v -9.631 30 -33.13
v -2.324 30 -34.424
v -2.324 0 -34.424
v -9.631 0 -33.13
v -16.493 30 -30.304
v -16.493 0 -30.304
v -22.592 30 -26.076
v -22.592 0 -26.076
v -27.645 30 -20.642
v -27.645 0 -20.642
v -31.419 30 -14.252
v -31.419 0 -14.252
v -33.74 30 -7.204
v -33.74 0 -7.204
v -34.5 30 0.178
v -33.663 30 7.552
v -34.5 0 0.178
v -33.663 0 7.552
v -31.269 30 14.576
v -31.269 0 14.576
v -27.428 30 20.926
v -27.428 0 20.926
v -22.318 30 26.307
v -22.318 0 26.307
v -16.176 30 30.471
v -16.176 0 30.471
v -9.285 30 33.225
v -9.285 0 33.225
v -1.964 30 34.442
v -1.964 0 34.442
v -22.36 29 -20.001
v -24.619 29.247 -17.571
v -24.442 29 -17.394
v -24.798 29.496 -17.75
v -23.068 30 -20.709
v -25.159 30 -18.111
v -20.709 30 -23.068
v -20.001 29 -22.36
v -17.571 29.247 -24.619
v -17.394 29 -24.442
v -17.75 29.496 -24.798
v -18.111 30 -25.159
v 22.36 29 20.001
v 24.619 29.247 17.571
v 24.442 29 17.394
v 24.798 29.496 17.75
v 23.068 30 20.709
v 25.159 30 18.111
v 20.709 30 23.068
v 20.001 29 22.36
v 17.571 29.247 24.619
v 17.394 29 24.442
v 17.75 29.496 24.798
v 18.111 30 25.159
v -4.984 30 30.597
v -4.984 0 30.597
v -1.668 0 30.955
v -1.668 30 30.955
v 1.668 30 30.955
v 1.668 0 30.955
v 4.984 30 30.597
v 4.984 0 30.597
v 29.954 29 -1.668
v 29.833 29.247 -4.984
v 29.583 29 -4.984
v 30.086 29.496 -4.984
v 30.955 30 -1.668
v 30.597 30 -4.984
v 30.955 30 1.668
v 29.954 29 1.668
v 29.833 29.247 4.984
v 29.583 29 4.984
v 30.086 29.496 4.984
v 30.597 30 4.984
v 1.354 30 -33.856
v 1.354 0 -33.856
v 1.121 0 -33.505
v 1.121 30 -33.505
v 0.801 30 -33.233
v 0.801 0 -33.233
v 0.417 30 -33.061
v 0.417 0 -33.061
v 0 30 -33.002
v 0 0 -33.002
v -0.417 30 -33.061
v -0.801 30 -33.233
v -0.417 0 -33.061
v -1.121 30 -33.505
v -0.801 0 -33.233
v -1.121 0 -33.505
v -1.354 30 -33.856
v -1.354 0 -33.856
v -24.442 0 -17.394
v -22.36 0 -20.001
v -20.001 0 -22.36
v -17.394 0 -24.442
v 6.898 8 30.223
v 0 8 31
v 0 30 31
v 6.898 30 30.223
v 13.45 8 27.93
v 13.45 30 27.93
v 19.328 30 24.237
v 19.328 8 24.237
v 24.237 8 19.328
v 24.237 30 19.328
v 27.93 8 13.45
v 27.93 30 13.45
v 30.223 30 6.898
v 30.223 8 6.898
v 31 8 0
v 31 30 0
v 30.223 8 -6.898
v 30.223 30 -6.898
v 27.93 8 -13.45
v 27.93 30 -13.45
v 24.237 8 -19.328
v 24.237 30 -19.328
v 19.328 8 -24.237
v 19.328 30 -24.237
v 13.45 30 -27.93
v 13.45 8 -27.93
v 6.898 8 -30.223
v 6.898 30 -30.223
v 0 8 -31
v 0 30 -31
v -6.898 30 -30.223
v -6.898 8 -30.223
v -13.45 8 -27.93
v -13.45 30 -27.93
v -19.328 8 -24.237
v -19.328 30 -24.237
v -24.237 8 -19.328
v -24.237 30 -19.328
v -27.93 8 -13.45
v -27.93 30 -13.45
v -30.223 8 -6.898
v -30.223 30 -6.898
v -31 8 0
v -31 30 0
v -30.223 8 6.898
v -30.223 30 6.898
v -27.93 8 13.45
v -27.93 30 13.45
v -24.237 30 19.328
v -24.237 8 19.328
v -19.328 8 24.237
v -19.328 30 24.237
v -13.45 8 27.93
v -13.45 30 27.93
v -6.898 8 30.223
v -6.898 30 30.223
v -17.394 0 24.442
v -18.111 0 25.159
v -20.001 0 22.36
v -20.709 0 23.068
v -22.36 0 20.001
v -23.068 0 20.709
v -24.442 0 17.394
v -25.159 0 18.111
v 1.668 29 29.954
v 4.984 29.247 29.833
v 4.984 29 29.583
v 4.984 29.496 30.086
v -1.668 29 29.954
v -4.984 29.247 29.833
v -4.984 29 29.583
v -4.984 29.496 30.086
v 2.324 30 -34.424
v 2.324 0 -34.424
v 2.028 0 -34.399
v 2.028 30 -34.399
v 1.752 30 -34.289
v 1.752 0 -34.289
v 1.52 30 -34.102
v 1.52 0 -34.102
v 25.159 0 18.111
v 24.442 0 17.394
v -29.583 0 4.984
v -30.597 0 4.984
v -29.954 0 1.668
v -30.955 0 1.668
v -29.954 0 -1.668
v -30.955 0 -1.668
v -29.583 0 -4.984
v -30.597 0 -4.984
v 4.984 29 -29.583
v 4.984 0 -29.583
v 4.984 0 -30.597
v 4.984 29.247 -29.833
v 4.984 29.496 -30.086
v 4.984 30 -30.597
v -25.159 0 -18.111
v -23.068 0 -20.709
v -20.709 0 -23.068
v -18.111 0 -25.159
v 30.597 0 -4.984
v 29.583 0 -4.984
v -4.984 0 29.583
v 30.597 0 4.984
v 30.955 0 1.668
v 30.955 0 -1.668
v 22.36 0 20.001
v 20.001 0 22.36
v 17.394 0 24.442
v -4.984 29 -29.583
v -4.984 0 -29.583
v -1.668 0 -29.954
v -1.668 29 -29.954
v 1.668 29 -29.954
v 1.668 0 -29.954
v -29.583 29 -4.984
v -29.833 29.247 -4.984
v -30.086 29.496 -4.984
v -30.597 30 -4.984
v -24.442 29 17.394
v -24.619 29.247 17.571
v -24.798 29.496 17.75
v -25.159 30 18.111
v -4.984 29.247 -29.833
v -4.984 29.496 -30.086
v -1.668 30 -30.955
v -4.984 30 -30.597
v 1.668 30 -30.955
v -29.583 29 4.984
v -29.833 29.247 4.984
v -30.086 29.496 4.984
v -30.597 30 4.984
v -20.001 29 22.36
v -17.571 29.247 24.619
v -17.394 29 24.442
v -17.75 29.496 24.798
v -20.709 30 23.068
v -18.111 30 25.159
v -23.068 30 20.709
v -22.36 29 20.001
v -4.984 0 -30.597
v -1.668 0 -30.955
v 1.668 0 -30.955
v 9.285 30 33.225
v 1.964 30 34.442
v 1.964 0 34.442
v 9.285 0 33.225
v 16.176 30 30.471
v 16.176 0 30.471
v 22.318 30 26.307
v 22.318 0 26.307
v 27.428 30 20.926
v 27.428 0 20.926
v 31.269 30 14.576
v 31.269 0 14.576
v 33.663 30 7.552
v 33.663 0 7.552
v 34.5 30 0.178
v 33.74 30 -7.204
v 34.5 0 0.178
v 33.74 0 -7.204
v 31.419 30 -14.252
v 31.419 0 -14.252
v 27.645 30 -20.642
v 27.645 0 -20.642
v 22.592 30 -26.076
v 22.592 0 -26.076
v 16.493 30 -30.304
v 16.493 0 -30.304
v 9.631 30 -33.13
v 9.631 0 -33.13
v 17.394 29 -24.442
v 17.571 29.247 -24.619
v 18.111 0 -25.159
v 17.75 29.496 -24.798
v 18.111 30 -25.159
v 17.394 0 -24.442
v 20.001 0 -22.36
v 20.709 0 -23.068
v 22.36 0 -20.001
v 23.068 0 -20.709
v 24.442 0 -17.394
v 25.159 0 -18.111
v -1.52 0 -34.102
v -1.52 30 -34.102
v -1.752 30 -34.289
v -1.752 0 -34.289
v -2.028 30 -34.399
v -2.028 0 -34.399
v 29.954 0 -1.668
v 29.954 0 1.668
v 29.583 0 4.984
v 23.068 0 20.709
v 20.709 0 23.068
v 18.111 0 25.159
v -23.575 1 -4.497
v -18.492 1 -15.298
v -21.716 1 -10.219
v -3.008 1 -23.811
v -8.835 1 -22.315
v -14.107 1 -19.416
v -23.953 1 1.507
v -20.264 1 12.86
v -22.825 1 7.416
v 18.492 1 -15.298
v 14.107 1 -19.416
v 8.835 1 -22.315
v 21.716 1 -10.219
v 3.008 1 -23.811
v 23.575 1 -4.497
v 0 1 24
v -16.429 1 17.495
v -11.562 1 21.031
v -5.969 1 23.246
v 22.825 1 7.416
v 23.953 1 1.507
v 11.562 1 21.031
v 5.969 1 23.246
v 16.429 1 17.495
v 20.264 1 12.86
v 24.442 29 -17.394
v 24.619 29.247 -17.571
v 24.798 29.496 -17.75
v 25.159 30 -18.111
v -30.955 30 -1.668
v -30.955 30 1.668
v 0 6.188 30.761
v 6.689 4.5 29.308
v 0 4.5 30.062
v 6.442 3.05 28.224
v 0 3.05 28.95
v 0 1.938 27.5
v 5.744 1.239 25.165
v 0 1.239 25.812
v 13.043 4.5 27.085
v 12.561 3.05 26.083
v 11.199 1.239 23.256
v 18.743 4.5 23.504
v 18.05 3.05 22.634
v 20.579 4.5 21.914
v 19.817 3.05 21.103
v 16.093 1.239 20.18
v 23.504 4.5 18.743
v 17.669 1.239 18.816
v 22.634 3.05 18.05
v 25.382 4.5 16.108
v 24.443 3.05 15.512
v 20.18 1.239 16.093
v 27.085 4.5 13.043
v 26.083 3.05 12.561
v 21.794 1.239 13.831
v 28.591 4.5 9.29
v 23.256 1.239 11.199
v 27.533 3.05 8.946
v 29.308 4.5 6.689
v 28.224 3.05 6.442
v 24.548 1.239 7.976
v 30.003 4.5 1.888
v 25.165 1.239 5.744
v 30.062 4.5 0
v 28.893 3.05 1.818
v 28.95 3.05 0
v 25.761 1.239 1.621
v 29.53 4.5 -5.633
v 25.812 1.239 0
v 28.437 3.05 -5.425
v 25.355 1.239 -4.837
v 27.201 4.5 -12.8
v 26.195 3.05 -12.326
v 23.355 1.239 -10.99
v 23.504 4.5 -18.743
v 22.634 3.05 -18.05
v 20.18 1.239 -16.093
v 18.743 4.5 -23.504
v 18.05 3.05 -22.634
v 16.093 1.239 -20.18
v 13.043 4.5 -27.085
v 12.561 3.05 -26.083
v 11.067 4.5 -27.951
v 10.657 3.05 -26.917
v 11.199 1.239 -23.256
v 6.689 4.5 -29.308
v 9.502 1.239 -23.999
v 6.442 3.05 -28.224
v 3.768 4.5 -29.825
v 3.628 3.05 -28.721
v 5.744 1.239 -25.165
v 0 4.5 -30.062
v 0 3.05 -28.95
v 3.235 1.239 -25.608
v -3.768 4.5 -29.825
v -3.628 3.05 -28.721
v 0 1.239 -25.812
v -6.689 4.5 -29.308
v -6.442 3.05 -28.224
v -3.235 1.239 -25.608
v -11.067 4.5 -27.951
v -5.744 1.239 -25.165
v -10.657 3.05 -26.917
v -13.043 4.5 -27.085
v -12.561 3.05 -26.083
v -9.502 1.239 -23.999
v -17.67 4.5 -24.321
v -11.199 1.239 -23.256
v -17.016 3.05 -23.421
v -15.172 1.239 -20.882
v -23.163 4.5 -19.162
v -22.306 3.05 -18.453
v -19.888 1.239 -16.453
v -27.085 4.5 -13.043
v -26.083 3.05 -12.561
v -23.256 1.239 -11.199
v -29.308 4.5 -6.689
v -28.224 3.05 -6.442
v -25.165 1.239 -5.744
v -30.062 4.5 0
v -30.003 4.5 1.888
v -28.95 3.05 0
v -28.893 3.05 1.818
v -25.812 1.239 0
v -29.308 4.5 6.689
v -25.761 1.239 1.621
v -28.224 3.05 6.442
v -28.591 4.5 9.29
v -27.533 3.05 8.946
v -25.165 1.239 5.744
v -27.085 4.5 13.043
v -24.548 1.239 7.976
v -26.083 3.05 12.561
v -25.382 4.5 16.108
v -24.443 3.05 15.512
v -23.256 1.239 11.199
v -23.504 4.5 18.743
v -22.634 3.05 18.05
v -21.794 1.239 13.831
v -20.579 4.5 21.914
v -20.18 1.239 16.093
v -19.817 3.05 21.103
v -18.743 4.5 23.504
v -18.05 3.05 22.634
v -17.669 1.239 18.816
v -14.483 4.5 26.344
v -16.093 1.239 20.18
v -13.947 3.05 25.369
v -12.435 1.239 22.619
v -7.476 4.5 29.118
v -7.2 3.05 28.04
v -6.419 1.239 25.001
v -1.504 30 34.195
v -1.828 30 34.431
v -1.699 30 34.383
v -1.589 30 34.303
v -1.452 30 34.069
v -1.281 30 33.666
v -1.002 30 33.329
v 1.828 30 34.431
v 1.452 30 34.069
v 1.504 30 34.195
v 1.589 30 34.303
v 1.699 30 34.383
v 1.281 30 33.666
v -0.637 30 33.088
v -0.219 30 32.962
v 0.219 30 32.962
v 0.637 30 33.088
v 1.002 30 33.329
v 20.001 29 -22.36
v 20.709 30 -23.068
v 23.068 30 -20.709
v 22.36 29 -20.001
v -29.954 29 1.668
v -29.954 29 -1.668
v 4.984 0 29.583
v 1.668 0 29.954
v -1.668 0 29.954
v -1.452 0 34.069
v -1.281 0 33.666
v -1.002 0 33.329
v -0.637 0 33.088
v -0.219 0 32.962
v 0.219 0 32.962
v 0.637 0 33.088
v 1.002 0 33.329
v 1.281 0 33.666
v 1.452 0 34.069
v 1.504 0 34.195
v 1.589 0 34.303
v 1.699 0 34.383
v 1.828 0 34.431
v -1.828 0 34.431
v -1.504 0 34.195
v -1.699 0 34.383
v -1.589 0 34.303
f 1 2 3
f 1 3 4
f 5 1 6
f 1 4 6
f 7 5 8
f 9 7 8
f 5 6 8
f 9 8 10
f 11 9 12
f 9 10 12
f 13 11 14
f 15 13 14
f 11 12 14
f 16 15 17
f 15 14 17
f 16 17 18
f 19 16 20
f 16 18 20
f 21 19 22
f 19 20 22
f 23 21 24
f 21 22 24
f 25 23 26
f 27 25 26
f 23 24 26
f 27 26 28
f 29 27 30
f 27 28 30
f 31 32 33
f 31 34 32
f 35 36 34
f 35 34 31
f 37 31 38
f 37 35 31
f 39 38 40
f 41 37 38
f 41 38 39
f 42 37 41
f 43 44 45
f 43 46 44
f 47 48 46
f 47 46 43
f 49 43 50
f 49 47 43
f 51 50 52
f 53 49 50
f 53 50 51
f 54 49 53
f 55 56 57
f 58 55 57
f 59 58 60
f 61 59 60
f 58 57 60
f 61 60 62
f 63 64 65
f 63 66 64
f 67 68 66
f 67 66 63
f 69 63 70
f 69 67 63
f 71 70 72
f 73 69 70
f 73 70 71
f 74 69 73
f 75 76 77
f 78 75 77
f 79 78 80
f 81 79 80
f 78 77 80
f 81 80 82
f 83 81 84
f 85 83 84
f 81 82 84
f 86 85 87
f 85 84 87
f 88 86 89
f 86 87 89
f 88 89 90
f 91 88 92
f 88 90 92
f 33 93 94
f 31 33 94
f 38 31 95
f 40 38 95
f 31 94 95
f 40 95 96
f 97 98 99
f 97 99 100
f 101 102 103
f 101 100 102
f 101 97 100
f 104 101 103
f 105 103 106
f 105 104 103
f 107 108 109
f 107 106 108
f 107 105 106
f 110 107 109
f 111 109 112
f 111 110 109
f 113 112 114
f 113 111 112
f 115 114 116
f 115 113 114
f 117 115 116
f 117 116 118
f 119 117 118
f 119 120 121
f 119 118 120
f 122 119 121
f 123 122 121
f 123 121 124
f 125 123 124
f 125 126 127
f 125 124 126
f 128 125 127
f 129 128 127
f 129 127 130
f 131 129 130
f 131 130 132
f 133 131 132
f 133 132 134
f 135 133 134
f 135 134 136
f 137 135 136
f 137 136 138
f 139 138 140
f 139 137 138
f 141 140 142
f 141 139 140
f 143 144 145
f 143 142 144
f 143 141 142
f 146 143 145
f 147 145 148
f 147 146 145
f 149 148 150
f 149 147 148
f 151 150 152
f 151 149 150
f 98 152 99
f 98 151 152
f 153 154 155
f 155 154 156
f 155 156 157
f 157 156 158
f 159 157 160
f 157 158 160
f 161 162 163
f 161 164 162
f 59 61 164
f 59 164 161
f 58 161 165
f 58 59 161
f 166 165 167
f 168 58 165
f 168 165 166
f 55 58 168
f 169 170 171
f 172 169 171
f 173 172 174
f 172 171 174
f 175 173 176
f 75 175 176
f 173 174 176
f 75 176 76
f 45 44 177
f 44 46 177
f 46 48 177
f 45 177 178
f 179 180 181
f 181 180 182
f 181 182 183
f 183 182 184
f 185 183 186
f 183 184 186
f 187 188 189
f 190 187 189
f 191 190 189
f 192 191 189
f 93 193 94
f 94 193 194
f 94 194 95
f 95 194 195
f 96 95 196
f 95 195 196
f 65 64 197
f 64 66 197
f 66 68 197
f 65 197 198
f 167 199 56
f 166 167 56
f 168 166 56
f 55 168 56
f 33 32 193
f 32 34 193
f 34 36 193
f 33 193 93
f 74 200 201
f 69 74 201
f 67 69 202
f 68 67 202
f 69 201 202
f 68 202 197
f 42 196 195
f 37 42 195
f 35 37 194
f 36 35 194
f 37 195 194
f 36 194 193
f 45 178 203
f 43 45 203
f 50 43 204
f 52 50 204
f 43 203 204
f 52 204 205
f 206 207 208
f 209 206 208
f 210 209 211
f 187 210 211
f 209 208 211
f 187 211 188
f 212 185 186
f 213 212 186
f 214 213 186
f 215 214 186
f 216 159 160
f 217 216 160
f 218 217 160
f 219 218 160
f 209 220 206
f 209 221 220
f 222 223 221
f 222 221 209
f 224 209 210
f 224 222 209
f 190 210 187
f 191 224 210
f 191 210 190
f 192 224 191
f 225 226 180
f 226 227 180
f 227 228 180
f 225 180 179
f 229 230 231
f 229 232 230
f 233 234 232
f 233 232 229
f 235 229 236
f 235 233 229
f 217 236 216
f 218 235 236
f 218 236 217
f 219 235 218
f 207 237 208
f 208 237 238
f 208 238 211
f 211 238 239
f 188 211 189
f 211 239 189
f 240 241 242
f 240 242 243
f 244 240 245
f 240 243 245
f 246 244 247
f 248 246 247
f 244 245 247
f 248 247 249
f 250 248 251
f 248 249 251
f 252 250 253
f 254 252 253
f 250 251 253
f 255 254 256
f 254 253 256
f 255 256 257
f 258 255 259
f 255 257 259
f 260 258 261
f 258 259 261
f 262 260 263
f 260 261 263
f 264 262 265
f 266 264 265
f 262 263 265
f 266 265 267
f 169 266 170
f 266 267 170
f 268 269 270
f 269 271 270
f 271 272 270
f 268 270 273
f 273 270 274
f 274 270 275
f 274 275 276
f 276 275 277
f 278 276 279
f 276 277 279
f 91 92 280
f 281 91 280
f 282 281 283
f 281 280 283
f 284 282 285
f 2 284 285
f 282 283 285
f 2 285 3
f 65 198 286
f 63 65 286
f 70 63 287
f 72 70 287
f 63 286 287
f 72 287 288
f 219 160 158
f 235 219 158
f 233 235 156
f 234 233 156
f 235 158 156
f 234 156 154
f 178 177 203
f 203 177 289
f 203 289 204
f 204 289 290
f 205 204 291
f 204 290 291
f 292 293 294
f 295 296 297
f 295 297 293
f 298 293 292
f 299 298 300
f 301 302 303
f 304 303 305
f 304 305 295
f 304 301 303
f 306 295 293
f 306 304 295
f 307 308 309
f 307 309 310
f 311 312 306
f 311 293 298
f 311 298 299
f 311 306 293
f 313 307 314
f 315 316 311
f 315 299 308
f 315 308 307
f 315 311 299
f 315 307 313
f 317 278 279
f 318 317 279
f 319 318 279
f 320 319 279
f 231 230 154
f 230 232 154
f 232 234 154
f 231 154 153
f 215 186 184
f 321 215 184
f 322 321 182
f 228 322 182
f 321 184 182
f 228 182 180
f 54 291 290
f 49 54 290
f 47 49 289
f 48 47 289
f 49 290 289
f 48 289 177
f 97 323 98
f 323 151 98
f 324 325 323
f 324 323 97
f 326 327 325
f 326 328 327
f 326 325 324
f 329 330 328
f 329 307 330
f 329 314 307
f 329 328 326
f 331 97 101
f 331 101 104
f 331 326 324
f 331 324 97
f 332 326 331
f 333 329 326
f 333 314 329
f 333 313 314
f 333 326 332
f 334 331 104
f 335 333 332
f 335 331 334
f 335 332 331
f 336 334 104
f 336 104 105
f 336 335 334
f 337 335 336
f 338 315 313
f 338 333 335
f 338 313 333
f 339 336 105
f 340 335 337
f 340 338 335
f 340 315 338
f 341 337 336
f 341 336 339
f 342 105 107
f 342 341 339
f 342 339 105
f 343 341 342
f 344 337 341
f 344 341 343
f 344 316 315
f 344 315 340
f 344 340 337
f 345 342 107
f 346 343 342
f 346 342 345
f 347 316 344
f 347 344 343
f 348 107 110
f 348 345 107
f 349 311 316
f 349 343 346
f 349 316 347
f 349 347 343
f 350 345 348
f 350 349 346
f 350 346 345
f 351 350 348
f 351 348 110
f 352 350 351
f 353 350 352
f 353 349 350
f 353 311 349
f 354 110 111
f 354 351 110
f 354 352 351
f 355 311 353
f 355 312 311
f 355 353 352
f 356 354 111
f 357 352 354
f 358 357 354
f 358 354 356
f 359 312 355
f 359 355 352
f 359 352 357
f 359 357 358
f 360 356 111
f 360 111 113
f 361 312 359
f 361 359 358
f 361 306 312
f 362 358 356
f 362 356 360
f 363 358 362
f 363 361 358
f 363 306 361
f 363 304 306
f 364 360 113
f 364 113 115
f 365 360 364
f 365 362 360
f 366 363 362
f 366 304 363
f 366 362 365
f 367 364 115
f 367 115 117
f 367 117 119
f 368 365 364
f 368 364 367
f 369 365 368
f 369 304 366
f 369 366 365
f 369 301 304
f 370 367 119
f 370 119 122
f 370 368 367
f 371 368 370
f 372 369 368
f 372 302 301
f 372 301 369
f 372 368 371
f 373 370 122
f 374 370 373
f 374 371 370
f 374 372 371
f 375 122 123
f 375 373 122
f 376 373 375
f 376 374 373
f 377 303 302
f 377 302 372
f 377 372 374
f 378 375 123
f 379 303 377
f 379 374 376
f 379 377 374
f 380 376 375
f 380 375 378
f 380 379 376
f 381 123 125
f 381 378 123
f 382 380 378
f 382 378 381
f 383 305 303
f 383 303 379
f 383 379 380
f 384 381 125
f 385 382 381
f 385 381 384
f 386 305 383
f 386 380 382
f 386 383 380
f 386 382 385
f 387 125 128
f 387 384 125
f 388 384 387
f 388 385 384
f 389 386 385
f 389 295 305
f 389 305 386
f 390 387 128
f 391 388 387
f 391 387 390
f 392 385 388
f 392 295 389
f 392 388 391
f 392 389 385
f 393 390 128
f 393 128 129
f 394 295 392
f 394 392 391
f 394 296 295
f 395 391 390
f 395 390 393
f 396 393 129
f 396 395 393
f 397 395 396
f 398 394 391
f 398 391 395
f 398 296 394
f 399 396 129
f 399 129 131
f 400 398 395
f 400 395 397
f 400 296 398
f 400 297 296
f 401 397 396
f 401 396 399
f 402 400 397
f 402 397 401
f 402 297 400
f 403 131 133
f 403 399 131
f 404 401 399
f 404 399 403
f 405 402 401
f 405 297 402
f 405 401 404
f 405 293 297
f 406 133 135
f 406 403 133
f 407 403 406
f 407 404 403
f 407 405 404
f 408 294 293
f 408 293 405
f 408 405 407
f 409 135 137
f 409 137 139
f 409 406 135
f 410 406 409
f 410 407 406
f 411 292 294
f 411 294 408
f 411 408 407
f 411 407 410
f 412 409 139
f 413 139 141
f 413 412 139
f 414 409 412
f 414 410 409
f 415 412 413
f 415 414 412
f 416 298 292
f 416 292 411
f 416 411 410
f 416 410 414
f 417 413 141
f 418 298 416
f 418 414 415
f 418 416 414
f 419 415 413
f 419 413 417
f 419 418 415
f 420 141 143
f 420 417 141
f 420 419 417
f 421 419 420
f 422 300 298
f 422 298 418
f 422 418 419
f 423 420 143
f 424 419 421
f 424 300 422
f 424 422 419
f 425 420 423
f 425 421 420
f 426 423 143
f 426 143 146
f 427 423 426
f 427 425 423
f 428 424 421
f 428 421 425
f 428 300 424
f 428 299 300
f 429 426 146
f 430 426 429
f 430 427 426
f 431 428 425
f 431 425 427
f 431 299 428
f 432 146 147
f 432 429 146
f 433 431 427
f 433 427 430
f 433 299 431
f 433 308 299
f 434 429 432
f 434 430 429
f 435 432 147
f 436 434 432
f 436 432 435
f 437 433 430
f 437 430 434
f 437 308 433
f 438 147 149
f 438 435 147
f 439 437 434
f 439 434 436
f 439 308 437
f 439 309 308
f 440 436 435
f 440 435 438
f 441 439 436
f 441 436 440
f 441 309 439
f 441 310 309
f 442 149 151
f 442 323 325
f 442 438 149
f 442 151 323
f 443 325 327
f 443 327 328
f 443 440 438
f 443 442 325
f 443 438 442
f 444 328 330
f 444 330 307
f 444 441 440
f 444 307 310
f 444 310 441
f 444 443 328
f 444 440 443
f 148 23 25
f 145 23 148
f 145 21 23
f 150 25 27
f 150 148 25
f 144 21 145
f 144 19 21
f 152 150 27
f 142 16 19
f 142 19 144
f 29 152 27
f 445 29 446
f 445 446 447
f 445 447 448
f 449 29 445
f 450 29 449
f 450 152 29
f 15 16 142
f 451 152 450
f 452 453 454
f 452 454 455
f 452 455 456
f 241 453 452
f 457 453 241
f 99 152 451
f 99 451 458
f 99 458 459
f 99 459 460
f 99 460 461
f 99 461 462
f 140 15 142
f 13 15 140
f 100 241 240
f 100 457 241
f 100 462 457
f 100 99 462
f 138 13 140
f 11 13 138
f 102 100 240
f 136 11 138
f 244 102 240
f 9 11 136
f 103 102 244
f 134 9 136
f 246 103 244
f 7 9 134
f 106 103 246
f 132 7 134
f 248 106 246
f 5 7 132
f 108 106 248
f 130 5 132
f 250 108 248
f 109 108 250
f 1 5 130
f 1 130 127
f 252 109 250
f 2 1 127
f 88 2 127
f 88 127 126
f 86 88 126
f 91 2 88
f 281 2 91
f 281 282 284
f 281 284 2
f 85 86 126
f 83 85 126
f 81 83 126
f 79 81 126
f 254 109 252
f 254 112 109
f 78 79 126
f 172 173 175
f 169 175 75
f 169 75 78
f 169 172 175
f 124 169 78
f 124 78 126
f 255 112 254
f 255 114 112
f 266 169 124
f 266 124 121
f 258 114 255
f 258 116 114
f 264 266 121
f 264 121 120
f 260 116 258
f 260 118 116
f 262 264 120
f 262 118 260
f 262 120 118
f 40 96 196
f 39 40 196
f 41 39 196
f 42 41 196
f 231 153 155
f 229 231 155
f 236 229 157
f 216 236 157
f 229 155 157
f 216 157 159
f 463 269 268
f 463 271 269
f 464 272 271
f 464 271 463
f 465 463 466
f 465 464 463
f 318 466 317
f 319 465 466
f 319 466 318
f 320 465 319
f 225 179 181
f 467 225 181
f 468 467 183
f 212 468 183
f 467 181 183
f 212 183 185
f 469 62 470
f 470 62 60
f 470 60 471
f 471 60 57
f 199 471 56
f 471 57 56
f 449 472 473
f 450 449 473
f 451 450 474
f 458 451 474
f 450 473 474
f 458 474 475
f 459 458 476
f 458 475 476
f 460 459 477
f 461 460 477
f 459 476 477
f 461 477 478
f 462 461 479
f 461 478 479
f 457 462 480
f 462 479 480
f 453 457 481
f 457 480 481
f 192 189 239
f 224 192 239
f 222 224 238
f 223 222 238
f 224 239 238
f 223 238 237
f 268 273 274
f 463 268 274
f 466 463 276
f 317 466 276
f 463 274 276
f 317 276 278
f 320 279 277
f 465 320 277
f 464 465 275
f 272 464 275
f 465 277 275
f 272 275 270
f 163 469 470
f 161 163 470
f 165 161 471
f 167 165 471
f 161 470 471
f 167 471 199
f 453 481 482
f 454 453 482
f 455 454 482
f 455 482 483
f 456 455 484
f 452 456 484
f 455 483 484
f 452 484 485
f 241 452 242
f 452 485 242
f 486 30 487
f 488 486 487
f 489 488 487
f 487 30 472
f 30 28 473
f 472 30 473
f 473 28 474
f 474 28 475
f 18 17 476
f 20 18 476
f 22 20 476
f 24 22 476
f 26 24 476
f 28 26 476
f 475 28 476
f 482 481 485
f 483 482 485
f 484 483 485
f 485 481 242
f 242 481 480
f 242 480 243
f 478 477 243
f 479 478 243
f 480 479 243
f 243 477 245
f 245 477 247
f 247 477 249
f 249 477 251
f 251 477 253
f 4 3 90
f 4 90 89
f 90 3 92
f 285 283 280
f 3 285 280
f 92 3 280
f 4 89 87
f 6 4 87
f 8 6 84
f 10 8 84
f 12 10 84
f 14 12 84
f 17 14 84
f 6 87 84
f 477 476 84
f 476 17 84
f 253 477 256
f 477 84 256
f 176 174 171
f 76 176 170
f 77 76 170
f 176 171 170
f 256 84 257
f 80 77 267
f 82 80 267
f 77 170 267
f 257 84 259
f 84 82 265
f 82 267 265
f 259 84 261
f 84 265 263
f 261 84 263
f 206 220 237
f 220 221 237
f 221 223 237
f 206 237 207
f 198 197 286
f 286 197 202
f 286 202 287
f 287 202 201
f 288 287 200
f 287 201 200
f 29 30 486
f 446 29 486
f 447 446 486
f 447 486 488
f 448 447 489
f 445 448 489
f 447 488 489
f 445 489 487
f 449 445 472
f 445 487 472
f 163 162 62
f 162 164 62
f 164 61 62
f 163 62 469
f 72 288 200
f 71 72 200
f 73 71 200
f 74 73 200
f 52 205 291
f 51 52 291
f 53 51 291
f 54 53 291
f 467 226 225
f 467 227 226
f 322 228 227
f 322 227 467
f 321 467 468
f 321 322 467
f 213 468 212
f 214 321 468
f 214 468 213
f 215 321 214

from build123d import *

# Parameters (mm, degrees)
BOSS_EXTRUDE1_DEPTH = 30
CUT_EXTRUDE2_REACH  = 60.241
CUT_EXTRUDE2_START  = 1
SKETCH2_R           = 31
BOSS_EXTRUDE2_DEPTH = 30
CHAMFER2_SIZE       = 1
CIRPATTERN2_COUNT   = 8
FILLET2_R           = 7


with BuildPart() as part:
    # Sketch1 → Boss-Extrude1 (new body)
    with BuildSketch(Plane(origin=(0, 0, 0), x_dir=(1, 0, 0), z_dir=(0, 1, 0))):
        with BuildLine():
            ThreePointArc((1.451818925, -34.068556857), (1.641248992, -34.346908706), (1.964225605, -34.442038138))
            ThreePointArc((1.964225605, -34.442038138), (34.499528846, -0.178302888), (2.324135821, 34.423627607))
            ThreePointArc((2.324135821, 34.423627607), (1.751838249, 34.289058819), (1.354061739, 33.856153382))
            ThreePointArc((1.354061739, 33.856153382), (0, 33.001534515), (-1.354061739, 33.856153382))
            ThreePointArc((-1.354061739, 33.856153382), (-1.751838249, 34.289058819), (-2.324135821, 34.423627607))
            ThreePointArc((-2.324135821, 34.423627607), (-34.499528846, -0.178302888), (-1.964225605, -34.442038138))
            ThreePointArc((-1.964225605, -34.442038138), (-1.641248992, -34.346908706), (-1.451818925, -34.068556857))
            ThreePointArc((-1.451818925, -34.068556857), (0, -32.945679925), (1.451818925, -34.068556857))
        make_face()
    extrude(amount=BOSS_EXTRUDE1_DEPTH)

    # Sketch2 → Cut-Extrude2 (cut, up to next)
    with BuildSketch(Plane(origin=(0, 0, 0), x_dir=(1, 0, 0), z_dir=(0, 1, 0)).offset(CUT_EXTRUDE2_START), mode=Mode.PRIVATE) as cut_extrude2_sk1:
        with Locations(Location((0, 0, 0), (0, 0, 270))):
            Circle(SKETCH2_R)
    cut_extrude2_tool1 = extrude(cut_extrude2_sk1.sketch, amount=CUT_EXTRUDE2_REACH, mode=Mode.PRIVATE) & part.part
    add(cut_extrude2_tool1.solids().sort_by_distance((0, 1, 0))[0], mode=Mode.SUBTRACT)

    # Fillet2
    fillet2_edges = [part.edges().sort_by_distance(p)[0] for p in [
        (0, 1, -31),
    ]]
    fillet(fillet2_edges, radius=FILLET2_R)


with BuildPart() as body_2:
    # Sketch2<2> → Boss-Extrude2 (new body)
    with BuildSketch(Plane(origin=(0, 0, 0), x_dir=(1, 0, 0), z_dir=(0, 1, 0))):
        with BuildLine():
            ThreePointArc((4.983714373, 30.596774194), (0, 31), (-4.983714373, 30.596774194))
            Line((-4.983714373, 30.596774194), (-4.983714373, 29.583147078))
            ThreePointArc((-4.983714373, 29.583147078), (0, 30), (4.983714373, 29.583147078))
            Line((4.983714373, 29.583147078), (4.983714373, 30.596774194))
        make_face()
    extrude(amount=BOSS_EXTRUDE2_DEPTH)

    # Chamfer2
    chamfer2_edges = [body_2.edges().sort_by_distance(p)[0] for p in [
        (0, 30, -30),
    ]]
    chamfer(chamfer2_edges, length=CHAMFER2_SIZE - 0.0001)  # a hair under: the kernel refuses the full size


with BuildPart() as cirpattern2_1:
    # CirPattern2: pattern copy
    add(body_2.part.rotate(Axis((0, 0, 0), (0, 1, 0)), 1 * 360 / CIRPATTERN2_COUNT))


with BuildPart() as cirpattern2_2:
    # CirPattern2: pattern copy
    add(body_2.part.rotate(Axis((0, 0, 0), (0, 1, 0)), 2 * 360 / CIRPATTERN2_COUNT))


with BuildPart() as cirpattern2_3:
    # CirPattern2: pattern copy
    add(body_2.part.rotate(Axis((0, 0, 0), (0, 1, 0)), 3 * 360 / CIRPATTERN2_COUNT))


with BuildPart() as cirpattern2_4:
    # CirPattern2: pattern copy
    add(body_2.part.rotate(Axis((0, 0, 0), (0, 1, 0)), 4 * 360 / CIRPATTERN2_COUNT))


with BuildPart() as cirpattern2_5:
    # CirPattern2: pattern copy
    add(body_2.part.rotate(Axis((0, 0, 0), (0, 1, 0)), 5 * 360 / CIRPATTERN2_COUNT))


with BuildPart() as cirpattern2_6:
    # CirPattern2: pattern copy
    add(body_2.part.rotate(Axis((0, 0, 0), (0, 1, 0)), 6 * 360 / CIRPATTERN2_COUNT))


with BuildPart() as cirpattern2_7:
    # CirPattern2: pattern copy
    add(body_2.part.rotate(Axis((0, 0, 0), (0, 1, 0)), 7 * 360 / CIRPATTERN2_COUNT))


solid = Compound([part.part, body_2.part, cirpattern2_1.part, cirpattern2_2.part, cirpattern2_3.part, cirpattern2_4.part, cirpattern2_5.part, cirpattern2_6.part, cirpattern2_7.part])
